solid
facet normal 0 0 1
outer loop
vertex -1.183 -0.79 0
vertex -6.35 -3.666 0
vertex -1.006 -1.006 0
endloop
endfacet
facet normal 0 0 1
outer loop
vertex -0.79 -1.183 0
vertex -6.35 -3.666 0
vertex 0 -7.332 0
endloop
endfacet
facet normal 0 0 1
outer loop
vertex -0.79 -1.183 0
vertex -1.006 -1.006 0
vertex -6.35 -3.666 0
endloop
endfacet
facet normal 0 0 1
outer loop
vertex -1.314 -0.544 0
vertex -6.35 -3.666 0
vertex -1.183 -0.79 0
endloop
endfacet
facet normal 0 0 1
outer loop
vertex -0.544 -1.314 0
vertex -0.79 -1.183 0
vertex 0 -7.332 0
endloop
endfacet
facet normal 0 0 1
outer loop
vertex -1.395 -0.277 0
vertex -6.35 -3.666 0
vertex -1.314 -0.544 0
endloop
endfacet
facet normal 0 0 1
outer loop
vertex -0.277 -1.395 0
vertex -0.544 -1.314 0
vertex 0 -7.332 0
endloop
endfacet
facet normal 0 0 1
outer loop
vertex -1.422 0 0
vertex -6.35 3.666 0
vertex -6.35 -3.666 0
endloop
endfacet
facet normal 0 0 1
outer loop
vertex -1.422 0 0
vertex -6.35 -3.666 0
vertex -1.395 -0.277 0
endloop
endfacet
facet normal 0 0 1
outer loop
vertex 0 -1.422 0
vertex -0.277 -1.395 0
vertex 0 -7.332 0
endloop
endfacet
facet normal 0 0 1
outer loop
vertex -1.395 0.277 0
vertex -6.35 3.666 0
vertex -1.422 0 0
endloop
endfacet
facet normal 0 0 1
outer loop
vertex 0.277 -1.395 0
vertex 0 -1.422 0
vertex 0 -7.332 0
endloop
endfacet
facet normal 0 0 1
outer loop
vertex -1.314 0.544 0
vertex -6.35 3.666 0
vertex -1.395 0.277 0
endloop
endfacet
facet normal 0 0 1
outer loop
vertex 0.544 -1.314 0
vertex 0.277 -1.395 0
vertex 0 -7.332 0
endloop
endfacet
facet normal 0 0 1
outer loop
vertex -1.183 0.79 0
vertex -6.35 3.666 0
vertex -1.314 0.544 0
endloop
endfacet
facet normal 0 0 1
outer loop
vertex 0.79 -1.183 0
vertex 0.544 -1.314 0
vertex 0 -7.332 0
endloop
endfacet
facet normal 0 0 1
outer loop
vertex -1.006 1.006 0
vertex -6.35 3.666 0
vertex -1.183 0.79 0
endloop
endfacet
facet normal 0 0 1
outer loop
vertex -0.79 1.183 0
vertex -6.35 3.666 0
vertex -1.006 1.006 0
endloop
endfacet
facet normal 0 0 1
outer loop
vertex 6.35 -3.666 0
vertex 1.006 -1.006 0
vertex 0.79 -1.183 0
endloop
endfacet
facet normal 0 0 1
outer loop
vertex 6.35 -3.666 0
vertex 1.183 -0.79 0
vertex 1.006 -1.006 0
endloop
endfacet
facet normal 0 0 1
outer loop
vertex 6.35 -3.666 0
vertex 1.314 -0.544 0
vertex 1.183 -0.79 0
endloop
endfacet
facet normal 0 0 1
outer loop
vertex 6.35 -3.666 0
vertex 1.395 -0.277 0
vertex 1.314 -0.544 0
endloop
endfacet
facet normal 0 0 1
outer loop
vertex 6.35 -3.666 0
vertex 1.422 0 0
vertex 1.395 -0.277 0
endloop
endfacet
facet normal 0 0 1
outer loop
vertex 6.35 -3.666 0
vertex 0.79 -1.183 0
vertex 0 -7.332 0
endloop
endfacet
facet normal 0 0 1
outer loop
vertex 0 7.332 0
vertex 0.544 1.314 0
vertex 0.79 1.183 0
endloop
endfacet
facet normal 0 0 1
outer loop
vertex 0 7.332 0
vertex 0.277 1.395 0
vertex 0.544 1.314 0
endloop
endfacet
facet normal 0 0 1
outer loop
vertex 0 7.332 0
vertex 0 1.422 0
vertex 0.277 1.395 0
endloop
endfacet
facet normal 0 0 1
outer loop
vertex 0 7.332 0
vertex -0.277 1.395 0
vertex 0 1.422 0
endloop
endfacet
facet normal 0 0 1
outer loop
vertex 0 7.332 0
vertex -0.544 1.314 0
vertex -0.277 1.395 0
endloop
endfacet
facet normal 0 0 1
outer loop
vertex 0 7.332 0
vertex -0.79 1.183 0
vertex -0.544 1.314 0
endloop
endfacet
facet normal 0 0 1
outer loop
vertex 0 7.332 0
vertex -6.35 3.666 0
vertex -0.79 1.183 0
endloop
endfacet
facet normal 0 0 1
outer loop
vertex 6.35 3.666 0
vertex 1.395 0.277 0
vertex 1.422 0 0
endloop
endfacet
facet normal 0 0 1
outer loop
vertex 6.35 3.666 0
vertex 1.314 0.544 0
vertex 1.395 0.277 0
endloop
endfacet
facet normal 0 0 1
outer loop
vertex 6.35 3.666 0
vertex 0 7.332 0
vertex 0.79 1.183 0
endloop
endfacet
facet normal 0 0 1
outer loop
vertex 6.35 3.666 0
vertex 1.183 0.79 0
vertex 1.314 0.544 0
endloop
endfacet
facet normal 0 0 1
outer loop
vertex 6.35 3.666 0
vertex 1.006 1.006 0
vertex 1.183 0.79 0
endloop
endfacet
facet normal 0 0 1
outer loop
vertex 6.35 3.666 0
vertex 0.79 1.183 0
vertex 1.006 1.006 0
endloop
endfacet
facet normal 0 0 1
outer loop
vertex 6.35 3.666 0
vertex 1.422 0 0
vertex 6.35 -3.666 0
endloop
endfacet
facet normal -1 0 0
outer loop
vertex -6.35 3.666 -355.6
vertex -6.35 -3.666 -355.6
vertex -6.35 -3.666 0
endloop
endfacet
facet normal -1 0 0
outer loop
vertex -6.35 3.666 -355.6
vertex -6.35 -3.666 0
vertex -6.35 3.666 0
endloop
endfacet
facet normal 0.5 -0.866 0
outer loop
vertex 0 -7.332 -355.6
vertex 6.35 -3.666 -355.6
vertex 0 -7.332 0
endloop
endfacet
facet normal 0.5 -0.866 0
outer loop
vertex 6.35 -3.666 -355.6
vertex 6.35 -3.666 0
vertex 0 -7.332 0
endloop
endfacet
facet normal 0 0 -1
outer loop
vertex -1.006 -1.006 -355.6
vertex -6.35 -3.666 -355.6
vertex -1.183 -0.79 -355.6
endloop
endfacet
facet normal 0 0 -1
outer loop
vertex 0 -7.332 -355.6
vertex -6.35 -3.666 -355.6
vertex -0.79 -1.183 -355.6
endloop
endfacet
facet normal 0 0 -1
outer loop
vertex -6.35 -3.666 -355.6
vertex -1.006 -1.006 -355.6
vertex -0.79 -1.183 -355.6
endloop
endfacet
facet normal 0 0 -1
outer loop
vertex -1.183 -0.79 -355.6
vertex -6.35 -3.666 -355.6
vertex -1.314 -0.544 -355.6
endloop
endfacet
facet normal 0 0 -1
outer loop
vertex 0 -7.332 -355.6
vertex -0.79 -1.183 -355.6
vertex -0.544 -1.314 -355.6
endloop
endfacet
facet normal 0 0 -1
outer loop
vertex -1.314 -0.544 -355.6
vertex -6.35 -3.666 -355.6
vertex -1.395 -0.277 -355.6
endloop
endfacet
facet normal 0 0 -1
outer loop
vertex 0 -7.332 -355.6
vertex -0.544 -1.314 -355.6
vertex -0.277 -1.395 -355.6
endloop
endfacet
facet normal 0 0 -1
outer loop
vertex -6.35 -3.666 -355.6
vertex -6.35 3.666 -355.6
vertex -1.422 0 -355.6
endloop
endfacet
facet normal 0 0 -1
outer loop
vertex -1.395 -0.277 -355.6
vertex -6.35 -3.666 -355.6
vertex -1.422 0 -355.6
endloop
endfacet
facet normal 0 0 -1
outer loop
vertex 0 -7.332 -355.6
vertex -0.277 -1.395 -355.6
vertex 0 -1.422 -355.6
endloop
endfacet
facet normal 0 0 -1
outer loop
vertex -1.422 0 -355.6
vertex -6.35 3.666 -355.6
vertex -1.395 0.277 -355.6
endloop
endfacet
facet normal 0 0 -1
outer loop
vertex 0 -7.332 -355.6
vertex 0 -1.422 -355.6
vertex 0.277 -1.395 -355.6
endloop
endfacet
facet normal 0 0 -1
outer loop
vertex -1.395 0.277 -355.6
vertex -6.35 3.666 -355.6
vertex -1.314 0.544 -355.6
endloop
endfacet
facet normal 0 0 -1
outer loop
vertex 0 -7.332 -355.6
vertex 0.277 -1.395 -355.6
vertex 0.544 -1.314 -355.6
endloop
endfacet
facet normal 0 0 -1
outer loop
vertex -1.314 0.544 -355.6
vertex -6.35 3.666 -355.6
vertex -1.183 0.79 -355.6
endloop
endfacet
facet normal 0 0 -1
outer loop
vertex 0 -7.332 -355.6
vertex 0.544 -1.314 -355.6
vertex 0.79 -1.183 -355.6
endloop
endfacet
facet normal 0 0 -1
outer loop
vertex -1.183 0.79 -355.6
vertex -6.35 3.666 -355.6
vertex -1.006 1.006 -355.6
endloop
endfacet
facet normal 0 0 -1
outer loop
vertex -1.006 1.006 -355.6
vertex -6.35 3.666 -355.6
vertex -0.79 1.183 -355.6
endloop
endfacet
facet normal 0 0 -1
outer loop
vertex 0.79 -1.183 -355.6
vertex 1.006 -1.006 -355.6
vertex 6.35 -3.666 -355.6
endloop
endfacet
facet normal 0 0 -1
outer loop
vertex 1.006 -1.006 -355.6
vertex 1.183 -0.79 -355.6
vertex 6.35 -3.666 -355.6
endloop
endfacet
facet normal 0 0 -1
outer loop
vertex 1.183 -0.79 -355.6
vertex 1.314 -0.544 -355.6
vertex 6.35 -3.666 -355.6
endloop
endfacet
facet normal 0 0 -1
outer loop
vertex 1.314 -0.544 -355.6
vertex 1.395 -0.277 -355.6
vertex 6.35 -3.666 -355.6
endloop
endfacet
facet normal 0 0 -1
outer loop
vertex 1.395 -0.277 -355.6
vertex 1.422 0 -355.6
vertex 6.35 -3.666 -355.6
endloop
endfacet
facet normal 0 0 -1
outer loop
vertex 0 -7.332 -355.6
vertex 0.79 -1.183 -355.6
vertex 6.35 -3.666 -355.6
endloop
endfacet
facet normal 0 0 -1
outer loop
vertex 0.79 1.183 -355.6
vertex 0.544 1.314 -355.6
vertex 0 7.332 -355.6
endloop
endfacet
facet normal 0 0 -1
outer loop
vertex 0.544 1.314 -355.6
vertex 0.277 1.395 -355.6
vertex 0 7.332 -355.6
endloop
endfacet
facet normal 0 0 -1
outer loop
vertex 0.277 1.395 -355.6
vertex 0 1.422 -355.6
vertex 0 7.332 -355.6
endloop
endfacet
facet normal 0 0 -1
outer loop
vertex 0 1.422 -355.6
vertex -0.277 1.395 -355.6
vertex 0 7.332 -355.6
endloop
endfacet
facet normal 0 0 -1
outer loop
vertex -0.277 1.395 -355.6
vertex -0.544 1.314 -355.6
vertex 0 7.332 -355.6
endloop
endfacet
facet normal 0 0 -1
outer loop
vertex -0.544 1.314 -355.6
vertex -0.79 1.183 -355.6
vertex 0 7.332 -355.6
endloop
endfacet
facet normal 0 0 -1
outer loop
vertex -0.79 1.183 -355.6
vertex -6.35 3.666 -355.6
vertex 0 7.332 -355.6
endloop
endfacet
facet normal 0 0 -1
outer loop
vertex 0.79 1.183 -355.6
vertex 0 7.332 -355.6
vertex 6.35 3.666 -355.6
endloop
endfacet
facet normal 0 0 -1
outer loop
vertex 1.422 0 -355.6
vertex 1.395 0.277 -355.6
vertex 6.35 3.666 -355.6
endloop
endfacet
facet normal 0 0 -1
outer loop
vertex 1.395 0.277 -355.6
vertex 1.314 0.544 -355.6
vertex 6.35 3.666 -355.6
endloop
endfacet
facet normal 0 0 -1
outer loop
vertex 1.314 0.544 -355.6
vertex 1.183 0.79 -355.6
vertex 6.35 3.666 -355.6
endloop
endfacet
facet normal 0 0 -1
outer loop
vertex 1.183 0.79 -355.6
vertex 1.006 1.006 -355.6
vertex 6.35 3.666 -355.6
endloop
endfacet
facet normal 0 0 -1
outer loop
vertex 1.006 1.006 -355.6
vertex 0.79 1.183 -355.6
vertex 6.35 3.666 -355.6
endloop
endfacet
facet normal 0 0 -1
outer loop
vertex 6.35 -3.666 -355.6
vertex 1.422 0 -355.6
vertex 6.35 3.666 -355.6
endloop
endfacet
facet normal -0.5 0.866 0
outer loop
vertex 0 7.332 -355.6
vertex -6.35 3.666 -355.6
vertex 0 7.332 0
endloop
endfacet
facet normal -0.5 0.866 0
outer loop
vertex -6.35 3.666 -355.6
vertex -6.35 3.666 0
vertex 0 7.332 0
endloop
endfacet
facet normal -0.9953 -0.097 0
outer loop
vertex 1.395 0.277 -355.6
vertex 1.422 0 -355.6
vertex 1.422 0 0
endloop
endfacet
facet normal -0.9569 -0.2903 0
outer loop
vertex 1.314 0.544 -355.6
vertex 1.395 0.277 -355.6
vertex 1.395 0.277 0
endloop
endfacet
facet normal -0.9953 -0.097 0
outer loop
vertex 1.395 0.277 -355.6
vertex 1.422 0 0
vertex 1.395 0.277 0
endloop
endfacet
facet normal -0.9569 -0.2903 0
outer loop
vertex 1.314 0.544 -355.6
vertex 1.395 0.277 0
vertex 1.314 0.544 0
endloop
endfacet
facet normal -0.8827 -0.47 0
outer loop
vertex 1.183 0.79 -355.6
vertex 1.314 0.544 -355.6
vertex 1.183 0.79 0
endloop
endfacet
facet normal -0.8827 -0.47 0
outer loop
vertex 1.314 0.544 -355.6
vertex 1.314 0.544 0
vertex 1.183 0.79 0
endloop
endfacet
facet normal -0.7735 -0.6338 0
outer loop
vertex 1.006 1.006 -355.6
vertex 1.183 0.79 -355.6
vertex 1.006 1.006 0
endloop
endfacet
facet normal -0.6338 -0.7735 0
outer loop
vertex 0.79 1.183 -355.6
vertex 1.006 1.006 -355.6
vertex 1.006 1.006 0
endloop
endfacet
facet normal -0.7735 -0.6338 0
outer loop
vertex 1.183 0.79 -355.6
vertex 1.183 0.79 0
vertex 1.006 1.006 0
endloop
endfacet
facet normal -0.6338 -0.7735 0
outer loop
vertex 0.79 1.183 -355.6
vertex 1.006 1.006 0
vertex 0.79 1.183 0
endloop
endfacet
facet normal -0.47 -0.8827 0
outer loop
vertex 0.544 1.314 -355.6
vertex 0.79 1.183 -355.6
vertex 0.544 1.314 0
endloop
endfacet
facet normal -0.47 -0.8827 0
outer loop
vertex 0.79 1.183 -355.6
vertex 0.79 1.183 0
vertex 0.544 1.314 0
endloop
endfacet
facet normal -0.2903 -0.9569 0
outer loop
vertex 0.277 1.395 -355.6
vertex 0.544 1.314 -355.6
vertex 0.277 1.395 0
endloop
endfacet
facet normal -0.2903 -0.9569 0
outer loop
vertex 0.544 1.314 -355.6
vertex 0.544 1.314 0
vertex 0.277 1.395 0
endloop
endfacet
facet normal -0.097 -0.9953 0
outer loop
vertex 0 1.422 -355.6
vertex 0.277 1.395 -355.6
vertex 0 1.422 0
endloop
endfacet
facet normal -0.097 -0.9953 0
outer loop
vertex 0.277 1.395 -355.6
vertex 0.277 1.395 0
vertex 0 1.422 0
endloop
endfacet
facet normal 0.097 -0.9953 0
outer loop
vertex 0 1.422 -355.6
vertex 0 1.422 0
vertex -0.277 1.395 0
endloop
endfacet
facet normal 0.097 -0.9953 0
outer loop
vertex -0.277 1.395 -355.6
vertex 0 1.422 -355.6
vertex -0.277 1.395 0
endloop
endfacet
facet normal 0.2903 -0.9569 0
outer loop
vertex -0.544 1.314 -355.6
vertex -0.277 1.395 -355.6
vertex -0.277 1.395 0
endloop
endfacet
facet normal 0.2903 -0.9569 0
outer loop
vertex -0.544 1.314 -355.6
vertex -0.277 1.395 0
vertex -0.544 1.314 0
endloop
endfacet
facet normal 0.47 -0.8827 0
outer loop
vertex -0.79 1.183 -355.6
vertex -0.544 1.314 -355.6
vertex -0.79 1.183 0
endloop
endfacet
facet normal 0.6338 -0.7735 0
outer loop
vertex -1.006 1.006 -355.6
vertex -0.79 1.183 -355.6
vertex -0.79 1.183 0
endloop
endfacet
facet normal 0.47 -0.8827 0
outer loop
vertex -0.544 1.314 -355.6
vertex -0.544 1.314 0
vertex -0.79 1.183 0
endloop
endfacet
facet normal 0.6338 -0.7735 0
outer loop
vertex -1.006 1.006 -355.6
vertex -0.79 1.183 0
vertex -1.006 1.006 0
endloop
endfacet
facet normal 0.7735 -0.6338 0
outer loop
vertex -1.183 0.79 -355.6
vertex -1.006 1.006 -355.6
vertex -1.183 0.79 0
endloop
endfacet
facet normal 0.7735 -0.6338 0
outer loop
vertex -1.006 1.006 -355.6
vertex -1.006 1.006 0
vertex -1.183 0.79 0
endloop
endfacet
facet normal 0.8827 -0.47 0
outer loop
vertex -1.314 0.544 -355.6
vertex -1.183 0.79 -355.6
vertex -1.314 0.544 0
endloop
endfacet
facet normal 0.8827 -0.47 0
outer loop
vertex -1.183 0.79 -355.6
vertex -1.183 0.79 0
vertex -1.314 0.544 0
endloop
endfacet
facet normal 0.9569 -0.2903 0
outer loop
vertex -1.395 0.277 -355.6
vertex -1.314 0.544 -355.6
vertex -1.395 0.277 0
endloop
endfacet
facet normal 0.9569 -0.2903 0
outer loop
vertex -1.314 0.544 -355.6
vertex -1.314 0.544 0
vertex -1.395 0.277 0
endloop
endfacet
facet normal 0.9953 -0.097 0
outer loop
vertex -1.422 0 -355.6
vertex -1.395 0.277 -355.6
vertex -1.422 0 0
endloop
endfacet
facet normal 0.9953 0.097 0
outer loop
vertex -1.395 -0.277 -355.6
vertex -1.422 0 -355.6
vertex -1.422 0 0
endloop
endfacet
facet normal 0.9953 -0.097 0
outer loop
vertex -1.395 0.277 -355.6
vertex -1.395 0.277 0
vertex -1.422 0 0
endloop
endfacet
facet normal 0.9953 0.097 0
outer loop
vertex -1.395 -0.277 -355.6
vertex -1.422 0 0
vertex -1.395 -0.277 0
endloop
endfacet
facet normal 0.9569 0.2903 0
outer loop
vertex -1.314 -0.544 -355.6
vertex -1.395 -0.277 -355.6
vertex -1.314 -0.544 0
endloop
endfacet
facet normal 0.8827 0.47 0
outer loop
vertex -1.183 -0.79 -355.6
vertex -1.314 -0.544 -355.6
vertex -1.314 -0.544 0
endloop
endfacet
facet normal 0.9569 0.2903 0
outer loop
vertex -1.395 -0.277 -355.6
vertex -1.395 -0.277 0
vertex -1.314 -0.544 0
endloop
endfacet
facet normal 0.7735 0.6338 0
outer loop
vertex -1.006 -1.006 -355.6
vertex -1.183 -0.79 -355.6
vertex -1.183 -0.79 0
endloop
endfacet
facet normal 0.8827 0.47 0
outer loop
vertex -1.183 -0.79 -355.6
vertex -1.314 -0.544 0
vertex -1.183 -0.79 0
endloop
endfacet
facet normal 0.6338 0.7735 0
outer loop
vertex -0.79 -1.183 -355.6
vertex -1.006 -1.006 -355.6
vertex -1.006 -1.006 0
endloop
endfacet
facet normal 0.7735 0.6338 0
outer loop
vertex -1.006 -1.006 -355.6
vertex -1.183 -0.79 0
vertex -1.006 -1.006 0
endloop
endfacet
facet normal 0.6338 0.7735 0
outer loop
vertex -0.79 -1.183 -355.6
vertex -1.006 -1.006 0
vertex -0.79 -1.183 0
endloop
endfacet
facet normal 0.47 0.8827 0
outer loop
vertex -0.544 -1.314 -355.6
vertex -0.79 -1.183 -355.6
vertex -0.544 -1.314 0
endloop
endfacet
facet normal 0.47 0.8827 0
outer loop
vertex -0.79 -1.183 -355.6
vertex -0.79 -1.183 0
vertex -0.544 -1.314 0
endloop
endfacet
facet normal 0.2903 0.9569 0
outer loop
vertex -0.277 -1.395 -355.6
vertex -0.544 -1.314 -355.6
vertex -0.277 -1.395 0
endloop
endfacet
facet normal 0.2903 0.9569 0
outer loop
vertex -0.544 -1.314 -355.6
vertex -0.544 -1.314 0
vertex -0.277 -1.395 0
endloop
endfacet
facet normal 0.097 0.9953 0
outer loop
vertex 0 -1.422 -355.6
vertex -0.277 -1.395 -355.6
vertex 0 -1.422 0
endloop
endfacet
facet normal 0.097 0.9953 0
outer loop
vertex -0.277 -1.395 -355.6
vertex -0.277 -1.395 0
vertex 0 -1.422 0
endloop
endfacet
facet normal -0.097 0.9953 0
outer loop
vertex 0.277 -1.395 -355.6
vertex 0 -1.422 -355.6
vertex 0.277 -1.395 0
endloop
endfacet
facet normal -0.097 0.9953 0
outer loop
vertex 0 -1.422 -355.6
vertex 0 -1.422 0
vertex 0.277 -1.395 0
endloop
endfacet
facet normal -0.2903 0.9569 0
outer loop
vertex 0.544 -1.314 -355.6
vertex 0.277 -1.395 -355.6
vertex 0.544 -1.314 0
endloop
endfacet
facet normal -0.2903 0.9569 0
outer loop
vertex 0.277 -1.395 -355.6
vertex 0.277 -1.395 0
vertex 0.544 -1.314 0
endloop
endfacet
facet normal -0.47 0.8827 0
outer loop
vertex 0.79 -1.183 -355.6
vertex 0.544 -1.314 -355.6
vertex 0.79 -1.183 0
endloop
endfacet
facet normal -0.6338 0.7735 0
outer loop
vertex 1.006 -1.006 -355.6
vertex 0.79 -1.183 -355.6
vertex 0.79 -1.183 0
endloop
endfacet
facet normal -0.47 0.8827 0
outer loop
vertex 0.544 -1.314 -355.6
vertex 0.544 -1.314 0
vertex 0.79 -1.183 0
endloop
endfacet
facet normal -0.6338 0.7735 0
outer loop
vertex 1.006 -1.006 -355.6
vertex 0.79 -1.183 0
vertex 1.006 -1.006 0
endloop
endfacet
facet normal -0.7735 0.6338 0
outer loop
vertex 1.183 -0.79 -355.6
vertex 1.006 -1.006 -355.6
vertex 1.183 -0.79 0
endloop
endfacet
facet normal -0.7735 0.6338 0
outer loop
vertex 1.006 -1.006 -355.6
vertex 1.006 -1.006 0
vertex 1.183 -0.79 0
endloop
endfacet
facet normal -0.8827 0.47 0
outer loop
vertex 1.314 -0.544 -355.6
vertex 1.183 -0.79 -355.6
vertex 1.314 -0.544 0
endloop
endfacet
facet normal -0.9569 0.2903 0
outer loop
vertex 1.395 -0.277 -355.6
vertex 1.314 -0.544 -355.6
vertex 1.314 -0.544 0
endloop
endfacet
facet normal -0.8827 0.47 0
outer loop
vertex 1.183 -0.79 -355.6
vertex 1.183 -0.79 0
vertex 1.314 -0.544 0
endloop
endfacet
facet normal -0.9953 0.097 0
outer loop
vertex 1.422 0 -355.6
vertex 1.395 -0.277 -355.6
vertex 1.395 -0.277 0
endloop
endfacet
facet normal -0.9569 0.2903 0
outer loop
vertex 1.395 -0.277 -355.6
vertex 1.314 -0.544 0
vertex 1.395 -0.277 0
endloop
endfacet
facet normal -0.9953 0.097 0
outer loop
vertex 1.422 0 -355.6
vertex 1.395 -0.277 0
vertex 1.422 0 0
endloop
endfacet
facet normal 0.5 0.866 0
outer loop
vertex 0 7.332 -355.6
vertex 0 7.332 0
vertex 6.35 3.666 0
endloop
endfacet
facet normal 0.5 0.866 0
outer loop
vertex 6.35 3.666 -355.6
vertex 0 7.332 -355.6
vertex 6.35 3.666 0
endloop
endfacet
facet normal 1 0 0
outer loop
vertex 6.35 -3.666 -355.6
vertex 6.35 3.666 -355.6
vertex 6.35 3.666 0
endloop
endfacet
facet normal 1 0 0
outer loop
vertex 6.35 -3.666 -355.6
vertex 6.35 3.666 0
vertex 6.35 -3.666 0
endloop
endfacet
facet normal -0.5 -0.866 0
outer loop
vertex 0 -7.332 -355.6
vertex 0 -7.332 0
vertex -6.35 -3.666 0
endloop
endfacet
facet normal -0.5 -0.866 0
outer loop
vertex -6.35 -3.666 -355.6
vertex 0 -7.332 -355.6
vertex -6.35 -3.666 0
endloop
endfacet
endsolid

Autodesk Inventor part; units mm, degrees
ref_plane "YZ Plane" through (0, 0, 0) normal (1, 0, 0) x (0, 1, 0)
ref_plane "XZ Plane" through (0, 0, 0) normal (0, 1, 0) x (-1, 0, 0)
ref_plane "XY Plane" through (0, 0, 0) normal (0, 0, 1) x (1, 0, 0)
sketch "Sketch1" plane through (0, 0, 0) normal (0, 0, 1) x (1, 0, 0)
  line L0 (6.35, 3.6662) -> (6.35, -3.6662)
  line L1 (6.35, -3.6662) -> (0, -7.3323)
  line L2 (0, -7.3323) -> (-6.35, -3.6662)
  line L3 (-6.35, -3.6662) -> (-6.35, 3.6662)
  line L4 (-6.35, 3.6662) -> (0, 7.3323)
  line L5 (0, 7.3323) -> (6.35, 3.6662)
  circle A0 centre (0, 0) radius 1.4224
  dimension "d0" = 12.7
  dimension "d3" = 2.8448
extrude "Extrusion1" add sketch "Sketch1" against normal blind 355.6
properties part number "SHAFT,HEX,0.500in,DRIVE,ELEVATOR" material "Steel, Alloy"
